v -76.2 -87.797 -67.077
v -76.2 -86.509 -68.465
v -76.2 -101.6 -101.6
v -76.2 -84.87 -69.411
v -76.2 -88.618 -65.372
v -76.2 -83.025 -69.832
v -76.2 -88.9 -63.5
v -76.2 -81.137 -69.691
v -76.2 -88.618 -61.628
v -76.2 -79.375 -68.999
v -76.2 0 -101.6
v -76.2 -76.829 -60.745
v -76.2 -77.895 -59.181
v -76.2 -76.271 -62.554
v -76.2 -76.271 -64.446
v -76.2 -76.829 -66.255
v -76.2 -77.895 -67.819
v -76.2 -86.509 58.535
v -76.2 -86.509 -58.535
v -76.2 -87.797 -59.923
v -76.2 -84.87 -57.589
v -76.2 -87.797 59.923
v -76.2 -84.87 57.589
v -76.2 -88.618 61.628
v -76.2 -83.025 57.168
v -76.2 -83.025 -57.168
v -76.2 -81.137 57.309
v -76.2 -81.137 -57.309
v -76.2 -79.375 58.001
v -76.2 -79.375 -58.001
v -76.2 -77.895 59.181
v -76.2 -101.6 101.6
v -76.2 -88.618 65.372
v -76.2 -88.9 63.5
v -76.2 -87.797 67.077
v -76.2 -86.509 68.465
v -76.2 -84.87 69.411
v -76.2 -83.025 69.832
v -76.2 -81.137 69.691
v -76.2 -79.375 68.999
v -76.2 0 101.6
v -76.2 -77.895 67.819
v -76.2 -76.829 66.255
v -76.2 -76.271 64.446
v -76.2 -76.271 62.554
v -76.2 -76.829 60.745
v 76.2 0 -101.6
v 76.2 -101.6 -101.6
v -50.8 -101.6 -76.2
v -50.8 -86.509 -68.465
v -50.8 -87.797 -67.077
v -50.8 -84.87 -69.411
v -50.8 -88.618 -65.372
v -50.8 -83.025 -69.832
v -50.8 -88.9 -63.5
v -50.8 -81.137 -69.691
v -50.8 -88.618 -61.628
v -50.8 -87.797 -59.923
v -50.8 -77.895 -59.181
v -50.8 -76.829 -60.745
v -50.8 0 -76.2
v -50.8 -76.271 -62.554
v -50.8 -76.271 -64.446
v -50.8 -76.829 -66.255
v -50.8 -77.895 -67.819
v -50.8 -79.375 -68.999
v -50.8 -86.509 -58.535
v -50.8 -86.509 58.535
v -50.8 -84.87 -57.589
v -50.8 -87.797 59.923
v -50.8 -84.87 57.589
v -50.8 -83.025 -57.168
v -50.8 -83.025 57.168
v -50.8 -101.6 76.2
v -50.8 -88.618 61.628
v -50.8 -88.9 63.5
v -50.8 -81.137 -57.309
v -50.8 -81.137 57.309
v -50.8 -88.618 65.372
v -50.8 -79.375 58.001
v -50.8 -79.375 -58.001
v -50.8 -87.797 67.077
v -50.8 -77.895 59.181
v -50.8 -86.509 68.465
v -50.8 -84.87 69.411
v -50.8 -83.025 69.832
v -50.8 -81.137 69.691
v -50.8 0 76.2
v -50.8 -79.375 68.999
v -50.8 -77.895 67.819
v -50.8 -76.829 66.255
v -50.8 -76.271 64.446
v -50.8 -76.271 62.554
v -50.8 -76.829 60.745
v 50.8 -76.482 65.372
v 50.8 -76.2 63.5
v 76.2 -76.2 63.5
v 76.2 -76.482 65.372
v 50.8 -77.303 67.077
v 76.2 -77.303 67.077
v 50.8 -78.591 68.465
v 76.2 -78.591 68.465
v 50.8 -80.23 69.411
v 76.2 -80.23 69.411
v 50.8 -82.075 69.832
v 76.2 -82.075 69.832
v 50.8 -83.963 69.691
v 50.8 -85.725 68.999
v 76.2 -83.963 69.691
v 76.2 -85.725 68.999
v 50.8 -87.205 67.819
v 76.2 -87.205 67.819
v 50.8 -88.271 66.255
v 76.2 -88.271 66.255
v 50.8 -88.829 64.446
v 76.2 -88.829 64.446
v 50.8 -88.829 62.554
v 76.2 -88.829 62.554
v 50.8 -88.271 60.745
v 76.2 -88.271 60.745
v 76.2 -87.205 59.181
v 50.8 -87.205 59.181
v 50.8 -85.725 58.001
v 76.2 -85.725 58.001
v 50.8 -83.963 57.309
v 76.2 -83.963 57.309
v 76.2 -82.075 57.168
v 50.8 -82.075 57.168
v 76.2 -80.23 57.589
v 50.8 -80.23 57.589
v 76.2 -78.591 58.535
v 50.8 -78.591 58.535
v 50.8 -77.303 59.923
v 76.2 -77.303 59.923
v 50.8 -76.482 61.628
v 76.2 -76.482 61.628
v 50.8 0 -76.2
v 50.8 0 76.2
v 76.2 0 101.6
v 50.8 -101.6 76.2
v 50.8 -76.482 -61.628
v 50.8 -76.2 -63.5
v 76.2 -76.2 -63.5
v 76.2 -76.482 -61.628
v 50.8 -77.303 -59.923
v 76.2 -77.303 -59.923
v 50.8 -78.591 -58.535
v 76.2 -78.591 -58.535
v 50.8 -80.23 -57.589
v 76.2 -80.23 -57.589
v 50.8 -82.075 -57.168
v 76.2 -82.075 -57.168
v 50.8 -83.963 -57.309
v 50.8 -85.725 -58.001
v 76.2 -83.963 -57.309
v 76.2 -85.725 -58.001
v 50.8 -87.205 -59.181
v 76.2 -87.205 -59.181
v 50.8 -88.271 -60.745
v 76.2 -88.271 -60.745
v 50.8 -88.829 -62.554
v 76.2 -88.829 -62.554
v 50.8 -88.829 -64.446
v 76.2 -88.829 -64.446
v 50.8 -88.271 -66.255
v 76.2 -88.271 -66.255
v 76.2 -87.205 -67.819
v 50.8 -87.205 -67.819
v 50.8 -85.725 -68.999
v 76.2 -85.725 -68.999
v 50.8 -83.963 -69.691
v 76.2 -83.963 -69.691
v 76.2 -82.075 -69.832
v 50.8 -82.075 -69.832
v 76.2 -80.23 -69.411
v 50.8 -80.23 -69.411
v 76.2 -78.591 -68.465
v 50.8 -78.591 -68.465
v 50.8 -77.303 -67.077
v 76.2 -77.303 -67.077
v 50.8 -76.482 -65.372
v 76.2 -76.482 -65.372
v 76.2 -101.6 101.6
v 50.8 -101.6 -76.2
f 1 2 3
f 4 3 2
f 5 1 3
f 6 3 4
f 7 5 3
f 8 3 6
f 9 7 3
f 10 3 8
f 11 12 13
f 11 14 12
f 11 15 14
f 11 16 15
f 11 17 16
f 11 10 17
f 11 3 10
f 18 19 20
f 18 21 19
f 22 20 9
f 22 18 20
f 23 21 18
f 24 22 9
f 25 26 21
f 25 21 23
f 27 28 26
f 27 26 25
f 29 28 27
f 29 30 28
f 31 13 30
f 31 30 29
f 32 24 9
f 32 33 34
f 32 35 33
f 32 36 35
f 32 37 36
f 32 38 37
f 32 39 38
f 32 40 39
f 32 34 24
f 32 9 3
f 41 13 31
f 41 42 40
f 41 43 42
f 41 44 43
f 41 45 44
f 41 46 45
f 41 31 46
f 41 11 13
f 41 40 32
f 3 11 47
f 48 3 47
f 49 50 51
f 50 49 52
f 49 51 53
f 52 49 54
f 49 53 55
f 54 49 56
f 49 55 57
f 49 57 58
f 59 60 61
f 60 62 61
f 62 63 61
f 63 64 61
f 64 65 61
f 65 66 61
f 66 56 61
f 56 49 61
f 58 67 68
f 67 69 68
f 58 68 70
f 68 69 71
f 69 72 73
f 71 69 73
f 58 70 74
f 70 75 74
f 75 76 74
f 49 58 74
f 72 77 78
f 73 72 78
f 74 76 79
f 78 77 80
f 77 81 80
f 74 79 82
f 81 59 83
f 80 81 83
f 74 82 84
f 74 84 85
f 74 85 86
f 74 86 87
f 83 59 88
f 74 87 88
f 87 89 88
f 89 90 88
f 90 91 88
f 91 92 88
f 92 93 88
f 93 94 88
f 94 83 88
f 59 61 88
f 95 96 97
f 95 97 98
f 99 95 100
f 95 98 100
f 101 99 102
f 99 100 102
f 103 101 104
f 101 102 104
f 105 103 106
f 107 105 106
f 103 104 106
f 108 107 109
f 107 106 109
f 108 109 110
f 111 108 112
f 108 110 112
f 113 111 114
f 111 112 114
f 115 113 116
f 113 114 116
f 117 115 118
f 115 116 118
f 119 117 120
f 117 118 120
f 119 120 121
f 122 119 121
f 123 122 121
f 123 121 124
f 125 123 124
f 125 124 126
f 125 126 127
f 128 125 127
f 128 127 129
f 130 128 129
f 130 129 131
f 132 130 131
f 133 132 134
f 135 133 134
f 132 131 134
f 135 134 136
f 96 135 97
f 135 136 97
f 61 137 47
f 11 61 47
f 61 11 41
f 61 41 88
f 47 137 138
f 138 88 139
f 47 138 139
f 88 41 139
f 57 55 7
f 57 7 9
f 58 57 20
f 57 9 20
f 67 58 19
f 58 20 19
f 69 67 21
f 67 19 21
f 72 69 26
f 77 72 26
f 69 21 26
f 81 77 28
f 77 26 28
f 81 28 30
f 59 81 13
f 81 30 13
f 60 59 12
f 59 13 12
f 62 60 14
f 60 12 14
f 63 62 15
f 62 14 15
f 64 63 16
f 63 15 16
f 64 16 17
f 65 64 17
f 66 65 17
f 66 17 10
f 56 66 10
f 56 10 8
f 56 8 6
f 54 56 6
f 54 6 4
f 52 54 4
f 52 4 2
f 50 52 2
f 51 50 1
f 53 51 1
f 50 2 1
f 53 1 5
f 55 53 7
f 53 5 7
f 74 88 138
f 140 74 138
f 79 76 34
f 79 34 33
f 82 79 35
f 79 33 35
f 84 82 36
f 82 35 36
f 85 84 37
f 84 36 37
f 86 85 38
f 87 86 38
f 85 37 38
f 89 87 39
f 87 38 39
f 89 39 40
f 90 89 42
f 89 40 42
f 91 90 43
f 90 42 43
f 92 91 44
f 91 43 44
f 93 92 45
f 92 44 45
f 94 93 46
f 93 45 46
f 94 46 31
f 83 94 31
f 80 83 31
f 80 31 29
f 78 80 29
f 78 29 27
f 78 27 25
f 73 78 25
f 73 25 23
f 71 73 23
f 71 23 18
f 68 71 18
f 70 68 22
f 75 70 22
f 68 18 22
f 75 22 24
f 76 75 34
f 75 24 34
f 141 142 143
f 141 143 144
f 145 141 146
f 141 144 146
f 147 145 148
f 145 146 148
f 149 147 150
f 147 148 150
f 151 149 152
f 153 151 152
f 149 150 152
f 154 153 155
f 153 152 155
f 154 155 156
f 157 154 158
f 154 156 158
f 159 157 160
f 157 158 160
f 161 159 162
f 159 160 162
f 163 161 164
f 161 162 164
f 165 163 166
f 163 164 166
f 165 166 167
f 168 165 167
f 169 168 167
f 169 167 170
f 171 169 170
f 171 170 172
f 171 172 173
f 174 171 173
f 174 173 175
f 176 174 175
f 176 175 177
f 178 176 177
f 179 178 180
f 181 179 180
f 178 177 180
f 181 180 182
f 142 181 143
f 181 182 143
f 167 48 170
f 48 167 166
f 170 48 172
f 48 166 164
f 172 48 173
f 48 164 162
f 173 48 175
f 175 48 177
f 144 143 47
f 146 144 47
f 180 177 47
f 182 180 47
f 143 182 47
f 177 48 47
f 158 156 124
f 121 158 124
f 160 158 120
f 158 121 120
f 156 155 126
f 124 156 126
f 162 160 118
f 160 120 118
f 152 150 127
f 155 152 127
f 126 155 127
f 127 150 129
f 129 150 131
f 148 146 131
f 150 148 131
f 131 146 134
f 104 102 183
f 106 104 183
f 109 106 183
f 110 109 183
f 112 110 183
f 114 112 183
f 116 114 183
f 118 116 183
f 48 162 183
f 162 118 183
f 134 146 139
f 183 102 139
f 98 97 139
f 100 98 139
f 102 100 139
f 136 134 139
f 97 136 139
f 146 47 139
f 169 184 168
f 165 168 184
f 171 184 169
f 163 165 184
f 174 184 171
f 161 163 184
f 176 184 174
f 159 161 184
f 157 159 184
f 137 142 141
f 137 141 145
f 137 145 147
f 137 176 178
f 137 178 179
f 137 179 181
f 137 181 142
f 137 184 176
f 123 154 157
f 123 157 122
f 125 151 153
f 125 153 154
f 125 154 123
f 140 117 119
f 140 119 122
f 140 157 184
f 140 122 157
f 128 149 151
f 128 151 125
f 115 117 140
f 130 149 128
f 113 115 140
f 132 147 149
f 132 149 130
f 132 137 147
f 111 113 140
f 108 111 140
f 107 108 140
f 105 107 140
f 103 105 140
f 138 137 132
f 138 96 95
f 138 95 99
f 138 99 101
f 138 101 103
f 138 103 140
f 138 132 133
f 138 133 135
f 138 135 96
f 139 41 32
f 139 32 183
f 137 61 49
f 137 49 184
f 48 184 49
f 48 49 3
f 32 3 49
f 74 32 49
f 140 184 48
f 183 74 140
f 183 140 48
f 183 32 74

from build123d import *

# Parameters (mm, degrees)
F0_W     = 152.4
F0_H     = 203.2
F0_W_2   = 101.6
F0_H_2   = 152.4
F1_DEPTH = 101.6
F2_R     = 6.35
F3_DEPTH = 25.4
F4_R     = 6.35
F5_DEPTH = 25.4


with BuildPart() as f1:
    # F0 (on Front) → F1 (new body)
    with BuildSketch(Plane.XZ):
        Rectangle(F0_W, F0_H)
        Rectangle(F0_W_2, F0_H_2, mode=Mode.SUBTRACT)
    extrude(amount=F1_DEPTH)

    # F2 (on face) → F3 (cut)
    with BuildSketch(Plane(origin=(-76.2, 0, 0), x_dir=(0, -1, 0), z_dir=(-1, 0, 0))):
        with Locations((82.55, -63.5)):
            Circle(F2_R)
        with Locations((82.55, 63.5)):
            Circle(F2_R)
    extrude(amount=-F3_DEPTH, mode=Mode.SUBTRACT)

    # F4 (on face) → F5 (cut)
    with BuildSketch(Plane.YZ.offset(76.2)):
        with Locations((-82.55, 63.5)):
            Circle(F4_R)
        with Locations((-82.55, -63.5)):
            Circle(F4_R)
    extrude(amount=-F5_DEPTH, mode=Mode.SUBTRACT)


solid = f1.part
